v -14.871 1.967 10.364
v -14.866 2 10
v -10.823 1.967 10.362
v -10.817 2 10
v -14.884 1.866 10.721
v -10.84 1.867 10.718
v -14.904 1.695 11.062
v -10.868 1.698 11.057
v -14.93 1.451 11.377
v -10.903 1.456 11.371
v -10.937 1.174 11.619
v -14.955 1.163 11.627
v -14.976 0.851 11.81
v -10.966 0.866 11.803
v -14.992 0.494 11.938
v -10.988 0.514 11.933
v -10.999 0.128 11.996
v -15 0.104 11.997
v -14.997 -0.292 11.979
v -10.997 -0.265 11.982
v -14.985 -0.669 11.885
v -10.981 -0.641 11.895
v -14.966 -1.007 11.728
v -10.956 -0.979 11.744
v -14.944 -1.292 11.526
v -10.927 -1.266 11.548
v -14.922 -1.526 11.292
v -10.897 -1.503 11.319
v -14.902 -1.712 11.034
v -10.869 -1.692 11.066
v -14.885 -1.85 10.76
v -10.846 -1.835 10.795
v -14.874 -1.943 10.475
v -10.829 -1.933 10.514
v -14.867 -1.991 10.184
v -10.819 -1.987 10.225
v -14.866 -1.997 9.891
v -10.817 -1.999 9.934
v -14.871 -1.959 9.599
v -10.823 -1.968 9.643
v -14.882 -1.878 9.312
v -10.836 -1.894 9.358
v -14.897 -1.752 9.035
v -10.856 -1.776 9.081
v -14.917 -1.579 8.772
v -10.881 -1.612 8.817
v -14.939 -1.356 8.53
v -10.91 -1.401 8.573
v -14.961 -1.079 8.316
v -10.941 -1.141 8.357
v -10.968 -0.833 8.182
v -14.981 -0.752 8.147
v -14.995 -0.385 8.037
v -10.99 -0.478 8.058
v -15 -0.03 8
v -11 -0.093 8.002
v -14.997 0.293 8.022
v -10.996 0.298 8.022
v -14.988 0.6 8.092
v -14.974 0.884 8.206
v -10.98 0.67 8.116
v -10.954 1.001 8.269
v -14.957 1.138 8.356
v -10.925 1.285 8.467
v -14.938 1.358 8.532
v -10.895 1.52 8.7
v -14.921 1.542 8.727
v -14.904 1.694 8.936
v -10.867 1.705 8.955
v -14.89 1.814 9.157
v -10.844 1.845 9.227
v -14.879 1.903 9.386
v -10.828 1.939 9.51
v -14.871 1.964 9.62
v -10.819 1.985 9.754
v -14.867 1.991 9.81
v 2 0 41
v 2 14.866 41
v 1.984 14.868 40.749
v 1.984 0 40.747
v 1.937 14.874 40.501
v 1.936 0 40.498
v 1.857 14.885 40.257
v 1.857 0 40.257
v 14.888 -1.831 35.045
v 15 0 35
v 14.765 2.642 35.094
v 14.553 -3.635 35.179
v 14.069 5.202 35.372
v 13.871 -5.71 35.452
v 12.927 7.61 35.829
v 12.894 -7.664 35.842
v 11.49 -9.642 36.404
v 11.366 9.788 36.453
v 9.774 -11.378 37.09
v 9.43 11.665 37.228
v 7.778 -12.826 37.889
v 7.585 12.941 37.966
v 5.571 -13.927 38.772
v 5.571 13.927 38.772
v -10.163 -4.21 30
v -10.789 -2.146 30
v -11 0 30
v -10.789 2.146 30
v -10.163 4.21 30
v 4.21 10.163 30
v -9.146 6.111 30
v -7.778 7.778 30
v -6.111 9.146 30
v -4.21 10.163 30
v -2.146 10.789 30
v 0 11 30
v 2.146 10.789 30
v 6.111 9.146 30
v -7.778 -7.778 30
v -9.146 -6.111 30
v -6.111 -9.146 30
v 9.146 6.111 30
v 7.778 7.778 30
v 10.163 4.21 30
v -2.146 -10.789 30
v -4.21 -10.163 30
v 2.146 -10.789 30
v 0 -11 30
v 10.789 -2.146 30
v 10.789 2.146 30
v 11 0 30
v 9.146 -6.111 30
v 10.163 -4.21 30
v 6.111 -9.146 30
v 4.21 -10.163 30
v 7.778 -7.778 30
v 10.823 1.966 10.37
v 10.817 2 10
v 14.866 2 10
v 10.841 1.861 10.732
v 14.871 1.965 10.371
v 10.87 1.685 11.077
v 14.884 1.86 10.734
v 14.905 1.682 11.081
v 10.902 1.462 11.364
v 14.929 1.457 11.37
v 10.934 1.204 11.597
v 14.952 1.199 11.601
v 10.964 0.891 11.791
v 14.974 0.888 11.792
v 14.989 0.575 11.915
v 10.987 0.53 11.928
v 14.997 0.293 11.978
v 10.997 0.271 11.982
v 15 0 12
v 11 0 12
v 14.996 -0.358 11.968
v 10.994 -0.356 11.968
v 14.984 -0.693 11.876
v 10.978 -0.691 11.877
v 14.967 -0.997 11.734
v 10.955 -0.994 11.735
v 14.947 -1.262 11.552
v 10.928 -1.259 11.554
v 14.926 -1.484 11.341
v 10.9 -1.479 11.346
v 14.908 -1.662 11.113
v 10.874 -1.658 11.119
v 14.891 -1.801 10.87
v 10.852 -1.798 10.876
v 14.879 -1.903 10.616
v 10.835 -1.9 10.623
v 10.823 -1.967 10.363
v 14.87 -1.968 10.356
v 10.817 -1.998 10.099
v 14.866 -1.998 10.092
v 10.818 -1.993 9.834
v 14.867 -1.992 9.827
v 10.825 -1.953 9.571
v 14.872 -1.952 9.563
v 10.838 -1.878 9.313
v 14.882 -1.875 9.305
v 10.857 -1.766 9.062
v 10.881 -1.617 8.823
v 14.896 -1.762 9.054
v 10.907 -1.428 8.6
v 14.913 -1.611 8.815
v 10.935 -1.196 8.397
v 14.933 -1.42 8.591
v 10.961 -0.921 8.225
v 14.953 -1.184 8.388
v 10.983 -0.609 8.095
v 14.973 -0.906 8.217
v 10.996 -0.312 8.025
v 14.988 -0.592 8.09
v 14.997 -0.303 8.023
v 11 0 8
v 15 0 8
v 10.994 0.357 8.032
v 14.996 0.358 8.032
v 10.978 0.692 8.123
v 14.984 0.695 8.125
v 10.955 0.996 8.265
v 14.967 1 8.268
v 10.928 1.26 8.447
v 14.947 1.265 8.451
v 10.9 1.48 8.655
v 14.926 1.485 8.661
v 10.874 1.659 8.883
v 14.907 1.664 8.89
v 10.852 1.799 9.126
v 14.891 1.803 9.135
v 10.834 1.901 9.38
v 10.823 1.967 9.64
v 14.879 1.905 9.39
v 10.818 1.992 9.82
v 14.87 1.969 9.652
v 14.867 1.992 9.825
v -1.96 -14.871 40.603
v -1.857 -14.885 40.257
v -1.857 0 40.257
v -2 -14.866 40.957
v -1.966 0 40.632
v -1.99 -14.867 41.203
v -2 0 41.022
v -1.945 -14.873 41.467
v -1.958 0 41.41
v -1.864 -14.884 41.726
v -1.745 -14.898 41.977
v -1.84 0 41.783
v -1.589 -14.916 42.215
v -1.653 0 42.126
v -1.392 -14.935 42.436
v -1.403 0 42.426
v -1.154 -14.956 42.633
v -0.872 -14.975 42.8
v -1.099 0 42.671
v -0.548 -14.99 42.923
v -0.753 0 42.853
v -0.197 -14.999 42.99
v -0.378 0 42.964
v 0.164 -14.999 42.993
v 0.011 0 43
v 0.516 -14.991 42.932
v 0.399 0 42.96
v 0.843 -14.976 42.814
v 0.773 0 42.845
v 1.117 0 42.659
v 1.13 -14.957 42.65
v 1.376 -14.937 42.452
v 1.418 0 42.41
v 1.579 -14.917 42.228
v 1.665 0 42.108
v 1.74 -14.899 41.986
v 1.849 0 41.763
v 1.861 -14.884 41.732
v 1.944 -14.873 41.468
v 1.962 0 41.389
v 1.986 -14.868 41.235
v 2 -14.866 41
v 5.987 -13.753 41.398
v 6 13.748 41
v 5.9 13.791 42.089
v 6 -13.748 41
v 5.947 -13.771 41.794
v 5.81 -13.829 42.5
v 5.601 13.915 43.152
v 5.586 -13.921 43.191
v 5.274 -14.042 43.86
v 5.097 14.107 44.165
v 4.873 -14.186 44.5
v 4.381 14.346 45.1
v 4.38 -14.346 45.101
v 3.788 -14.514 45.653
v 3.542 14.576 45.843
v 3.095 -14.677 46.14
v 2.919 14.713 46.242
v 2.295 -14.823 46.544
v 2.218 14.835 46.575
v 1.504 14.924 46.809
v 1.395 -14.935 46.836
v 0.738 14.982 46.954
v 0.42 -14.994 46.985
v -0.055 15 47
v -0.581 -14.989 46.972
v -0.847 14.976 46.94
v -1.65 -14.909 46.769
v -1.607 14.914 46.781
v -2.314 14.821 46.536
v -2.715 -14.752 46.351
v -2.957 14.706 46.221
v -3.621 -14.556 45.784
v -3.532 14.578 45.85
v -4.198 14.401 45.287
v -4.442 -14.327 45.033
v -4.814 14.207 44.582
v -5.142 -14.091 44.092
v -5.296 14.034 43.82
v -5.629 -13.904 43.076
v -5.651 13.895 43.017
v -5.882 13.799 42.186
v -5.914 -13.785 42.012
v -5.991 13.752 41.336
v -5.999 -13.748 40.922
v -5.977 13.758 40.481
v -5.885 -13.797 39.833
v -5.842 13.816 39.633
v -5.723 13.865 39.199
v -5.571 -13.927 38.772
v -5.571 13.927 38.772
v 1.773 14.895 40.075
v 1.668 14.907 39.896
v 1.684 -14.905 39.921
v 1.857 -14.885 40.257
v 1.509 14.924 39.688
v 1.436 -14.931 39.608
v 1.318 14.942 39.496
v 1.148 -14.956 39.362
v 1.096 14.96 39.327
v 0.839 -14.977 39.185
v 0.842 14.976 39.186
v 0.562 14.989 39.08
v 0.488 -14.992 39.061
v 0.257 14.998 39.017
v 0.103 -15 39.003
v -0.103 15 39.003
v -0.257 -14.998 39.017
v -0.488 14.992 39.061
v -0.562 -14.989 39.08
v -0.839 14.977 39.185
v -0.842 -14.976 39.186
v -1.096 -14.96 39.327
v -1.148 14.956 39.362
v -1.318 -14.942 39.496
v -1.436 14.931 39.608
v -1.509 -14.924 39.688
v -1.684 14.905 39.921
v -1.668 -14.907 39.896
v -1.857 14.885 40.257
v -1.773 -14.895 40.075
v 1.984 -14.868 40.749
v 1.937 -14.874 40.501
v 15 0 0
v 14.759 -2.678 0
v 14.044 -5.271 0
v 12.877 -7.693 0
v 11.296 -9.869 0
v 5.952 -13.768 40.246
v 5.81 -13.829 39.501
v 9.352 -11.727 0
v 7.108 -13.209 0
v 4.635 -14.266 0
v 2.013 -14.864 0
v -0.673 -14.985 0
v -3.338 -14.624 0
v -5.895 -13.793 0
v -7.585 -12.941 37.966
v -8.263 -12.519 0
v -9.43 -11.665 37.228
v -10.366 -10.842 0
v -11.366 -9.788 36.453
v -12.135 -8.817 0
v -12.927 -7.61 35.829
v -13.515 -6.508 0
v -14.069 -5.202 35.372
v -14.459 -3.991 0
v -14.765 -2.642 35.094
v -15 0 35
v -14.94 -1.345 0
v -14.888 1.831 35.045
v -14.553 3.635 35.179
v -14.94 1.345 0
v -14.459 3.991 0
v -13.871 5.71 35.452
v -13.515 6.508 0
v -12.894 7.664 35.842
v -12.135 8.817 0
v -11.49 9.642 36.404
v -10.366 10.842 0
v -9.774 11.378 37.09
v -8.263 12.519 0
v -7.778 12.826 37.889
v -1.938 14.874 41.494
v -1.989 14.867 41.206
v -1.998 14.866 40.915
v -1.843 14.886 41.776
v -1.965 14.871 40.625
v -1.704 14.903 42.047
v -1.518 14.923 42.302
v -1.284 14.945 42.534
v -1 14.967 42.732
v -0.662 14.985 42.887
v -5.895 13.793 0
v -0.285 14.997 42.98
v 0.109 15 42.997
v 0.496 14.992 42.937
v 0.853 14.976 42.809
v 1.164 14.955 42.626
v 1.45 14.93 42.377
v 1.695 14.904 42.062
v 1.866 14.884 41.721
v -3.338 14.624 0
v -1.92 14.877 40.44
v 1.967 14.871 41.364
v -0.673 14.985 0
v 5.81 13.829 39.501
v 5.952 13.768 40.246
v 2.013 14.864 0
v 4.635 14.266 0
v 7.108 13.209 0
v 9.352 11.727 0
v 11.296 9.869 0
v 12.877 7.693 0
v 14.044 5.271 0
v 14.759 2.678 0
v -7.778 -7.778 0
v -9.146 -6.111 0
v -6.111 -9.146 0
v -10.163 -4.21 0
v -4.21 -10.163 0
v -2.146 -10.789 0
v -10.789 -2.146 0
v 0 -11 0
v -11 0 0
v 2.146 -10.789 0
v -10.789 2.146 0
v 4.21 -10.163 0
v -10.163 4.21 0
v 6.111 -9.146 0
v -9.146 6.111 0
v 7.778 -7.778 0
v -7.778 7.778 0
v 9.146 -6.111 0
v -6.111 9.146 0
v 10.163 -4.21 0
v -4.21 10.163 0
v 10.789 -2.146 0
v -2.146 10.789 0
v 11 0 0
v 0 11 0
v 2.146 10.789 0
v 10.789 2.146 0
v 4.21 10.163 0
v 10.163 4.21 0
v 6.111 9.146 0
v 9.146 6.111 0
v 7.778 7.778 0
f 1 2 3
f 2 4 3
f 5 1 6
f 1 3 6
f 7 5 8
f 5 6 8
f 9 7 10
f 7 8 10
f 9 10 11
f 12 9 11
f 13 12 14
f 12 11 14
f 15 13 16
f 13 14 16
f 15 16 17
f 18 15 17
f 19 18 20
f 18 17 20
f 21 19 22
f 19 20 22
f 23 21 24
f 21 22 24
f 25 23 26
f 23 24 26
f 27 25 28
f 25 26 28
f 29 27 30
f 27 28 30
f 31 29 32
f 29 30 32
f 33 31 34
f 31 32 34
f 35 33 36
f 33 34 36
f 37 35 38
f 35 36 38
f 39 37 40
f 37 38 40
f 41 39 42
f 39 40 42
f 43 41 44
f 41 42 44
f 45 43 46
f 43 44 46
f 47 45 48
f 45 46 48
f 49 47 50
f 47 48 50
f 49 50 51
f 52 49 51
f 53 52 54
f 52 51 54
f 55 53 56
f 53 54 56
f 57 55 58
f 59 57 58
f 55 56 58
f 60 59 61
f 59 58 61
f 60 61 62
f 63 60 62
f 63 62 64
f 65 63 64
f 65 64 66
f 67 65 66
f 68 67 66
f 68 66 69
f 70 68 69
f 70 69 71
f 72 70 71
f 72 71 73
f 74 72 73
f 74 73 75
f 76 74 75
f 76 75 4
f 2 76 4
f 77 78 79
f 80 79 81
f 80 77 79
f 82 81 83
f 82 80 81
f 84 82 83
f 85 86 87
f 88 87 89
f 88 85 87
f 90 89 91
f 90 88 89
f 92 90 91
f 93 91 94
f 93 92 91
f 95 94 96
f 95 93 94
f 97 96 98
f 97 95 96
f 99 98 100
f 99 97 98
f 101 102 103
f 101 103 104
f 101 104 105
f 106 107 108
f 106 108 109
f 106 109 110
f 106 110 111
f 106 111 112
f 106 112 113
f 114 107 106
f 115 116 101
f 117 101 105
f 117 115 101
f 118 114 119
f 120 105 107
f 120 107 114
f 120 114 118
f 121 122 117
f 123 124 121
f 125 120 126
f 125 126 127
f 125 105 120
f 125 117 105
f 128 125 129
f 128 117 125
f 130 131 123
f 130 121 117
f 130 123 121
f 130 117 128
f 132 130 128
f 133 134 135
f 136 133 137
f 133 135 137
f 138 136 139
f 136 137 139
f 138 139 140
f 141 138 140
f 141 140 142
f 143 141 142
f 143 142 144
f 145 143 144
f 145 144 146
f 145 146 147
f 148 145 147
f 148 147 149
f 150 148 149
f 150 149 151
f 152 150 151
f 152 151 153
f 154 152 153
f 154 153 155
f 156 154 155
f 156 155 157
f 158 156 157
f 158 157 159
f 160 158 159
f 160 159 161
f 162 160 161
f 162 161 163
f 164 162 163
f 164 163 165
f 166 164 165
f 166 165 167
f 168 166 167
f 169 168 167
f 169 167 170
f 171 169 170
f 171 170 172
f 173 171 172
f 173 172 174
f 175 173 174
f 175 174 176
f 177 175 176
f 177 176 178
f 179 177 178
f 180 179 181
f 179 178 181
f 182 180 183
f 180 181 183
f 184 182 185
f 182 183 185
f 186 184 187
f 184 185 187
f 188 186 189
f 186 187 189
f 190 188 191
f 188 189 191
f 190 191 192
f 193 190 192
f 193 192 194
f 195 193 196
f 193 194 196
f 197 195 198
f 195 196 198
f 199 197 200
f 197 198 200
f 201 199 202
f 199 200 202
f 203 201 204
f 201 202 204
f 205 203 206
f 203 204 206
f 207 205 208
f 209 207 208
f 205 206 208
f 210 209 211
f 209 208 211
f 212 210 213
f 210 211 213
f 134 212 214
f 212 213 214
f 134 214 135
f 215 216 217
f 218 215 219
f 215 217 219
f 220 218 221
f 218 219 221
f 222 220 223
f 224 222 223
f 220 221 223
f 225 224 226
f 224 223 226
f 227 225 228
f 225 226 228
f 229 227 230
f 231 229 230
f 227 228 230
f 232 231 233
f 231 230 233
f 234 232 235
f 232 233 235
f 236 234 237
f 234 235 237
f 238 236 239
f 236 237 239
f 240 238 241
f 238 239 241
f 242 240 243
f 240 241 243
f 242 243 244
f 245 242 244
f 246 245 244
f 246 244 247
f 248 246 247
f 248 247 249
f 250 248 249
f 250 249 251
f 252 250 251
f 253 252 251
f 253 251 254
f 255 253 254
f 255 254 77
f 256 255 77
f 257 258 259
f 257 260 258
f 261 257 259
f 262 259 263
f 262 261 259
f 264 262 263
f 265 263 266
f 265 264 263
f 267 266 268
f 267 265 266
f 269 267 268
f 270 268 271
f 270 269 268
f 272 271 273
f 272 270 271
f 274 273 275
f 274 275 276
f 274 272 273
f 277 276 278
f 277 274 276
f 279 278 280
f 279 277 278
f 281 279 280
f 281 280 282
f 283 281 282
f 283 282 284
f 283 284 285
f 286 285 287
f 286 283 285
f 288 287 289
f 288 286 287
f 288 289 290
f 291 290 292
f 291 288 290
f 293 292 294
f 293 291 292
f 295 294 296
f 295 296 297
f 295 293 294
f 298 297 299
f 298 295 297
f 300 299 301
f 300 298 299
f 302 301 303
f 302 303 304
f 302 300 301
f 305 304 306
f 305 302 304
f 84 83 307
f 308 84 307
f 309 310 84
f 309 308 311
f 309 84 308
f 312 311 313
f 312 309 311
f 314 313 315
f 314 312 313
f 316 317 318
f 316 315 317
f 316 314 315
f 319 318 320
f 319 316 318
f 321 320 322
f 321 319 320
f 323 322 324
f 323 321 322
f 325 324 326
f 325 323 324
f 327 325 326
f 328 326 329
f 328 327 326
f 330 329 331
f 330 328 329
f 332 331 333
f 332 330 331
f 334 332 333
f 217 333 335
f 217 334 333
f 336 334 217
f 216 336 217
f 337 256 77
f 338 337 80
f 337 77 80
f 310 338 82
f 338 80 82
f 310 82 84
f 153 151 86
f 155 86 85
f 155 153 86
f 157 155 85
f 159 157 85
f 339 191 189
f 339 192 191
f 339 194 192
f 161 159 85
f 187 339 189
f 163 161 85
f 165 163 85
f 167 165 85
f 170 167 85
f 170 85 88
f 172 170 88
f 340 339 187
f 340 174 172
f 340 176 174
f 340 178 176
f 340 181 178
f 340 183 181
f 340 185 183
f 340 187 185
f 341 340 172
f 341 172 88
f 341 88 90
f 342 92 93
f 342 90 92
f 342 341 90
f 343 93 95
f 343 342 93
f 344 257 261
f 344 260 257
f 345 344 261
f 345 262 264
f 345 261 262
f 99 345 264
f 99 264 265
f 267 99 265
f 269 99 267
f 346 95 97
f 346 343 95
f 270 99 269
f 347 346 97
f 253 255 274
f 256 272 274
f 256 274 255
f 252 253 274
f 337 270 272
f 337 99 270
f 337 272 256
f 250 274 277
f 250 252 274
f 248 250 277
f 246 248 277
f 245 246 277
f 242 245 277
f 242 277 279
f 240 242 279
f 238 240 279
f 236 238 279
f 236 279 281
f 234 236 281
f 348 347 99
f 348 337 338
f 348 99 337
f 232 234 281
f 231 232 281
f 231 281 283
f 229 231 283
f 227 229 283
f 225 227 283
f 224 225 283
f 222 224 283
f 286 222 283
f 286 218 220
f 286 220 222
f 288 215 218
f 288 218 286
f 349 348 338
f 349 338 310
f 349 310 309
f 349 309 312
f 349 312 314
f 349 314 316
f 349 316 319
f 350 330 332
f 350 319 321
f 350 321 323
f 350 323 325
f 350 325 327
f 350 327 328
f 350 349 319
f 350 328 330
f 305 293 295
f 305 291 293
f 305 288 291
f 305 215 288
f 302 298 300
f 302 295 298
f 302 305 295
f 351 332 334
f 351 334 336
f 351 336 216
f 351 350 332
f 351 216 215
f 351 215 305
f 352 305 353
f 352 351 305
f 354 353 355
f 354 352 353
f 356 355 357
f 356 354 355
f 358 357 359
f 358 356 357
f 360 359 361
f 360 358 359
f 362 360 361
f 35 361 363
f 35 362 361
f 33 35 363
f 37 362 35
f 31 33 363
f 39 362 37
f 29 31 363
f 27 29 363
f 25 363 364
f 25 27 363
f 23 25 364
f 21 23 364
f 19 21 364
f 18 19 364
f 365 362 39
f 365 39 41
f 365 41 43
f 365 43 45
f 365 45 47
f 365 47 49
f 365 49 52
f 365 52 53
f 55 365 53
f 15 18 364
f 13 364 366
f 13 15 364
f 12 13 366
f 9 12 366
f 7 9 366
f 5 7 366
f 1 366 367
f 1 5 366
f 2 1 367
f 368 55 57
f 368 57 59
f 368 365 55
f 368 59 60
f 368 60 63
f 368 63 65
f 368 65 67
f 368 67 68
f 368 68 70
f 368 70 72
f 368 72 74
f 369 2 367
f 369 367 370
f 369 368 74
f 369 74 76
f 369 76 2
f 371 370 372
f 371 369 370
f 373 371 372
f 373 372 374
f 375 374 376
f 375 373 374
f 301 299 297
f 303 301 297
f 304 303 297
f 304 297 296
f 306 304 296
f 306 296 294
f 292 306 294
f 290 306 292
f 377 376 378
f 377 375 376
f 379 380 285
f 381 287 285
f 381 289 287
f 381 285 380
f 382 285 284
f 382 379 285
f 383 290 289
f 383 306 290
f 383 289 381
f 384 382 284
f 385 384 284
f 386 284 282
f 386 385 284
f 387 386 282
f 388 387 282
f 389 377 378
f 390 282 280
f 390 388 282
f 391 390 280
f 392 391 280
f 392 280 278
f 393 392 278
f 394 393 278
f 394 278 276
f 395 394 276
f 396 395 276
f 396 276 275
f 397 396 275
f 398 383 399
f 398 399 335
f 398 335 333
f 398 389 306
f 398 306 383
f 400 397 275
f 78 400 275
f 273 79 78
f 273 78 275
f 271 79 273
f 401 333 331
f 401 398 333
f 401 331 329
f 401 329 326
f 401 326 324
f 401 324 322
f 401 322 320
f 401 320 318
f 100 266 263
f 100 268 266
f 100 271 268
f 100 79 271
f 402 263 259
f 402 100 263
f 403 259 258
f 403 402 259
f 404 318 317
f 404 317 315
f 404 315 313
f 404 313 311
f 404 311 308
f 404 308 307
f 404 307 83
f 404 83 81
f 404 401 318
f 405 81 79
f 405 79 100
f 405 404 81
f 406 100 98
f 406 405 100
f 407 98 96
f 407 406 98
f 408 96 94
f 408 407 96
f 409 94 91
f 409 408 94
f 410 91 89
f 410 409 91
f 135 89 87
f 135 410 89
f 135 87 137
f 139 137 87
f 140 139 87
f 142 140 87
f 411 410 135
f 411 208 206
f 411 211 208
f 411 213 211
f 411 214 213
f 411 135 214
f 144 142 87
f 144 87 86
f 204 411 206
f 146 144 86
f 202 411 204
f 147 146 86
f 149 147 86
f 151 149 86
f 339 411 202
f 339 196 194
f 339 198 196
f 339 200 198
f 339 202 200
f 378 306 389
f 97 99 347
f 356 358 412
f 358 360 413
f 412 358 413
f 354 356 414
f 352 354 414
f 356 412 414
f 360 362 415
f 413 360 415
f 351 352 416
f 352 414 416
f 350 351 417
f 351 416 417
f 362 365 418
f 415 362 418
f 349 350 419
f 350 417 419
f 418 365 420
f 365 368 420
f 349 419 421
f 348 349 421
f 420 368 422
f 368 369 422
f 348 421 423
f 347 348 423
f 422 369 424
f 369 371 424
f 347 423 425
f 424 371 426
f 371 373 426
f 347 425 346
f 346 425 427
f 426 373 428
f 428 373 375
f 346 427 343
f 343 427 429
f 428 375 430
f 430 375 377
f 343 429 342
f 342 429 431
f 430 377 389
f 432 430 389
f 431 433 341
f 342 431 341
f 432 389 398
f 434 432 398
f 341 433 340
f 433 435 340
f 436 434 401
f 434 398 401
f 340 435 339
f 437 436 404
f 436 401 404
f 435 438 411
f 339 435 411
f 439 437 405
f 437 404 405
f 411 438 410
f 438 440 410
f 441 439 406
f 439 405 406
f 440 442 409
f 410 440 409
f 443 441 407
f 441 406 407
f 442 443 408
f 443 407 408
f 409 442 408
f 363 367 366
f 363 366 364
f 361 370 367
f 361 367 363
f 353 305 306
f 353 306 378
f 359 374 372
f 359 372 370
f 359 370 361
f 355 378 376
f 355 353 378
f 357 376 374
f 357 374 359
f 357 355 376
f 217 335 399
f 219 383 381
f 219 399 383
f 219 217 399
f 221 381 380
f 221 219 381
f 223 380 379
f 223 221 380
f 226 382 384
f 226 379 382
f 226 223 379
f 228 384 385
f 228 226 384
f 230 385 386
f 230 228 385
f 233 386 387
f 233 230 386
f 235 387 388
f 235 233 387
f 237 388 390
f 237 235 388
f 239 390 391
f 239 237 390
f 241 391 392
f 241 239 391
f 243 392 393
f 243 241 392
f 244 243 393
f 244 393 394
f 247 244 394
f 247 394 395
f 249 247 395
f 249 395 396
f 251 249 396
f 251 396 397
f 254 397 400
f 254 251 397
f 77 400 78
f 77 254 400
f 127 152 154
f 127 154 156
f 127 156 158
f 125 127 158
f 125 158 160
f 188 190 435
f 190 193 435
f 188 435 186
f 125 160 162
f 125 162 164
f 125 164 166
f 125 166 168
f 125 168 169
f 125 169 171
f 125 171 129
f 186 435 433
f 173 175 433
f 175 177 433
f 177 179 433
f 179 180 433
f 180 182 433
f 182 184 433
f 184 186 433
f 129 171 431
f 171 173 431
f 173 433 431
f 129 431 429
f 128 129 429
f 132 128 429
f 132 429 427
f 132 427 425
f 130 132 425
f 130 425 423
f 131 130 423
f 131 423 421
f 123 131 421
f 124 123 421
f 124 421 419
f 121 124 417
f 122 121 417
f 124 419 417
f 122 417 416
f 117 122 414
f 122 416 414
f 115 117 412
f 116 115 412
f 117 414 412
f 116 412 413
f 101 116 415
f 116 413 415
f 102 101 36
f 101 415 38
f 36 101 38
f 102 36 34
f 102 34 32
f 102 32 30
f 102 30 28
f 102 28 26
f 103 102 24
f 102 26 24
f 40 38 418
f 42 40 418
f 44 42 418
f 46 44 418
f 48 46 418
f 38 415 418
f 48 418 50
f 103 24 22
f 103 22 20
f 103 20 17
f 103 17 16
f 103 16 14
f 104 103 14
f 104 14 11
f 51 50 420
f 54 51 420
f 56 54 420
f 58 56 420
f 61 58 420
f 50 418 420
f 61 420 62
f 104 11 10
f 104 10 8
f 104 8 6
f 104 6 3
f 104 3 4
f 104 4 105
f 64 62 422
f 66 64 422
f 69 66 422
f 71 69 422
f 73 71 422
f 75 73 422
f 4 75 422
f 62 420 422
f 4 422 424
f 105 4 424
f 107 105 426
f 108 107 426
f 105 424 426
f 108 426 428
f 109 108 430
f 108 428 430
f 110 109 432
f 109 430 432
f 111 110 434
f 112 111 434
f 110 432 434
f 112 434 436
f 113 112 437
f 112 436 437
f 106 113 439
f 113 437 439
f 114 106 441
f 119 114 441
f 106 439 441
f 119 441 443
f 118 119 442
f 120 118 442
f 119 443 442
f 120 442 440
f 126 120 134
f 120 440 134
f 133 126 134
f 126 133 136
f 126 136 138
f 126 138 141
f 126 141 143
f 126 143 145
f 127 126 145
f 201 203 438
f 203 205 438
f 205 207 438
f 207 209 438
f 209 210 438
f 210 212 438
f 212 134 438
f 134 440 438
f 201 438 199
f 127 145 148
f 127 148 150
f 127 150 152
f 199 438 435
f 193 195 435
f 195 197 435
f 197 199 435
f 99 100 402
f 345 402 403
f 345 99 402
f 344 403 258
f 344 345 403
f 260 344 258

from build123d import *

# Parameters (mm, degrees)
F0_R     = 15
F1_DEPTH = 35
F3_DEPTH = 15
F4_W     = 36.4194698632
F4_H     = 35.84138304
F4_R     = 15
F5_DEPTH = 50
F6_R     = 11
F7_DEPTH = 30
F8_R     = 2
F9_DEPTH = 15


with BuildPart() as f1:
    # F0 (on Top) → F1 (new body)
    with BuildSketch(Plane.XY):
        Circle(F0_R)
    extrude(amount=F1_DEPTH)

    # F2 (on Front) → F3 (join, symmetric)
    with BuildSketch(Plane.XZ):
        with BuildLine():
            ThreePointArc((1.082e-07, 35), (-3.363772811, 36.0315965868), (-5.5708601453, 38.7716559419))
            Line((-5.5708601453, 38.7716559419), (-15, 35))
            Line((-15, 35), (1.082e-07, 35))
        make_face()
        with BuildLine():
            Line((-1.8569533818, 40.2572186473), (-5.5708601453, 38.7716559419))
            ThreePointArc((-5.5708601453, 38.7716559419), (-3.363772811, 36.0315965868), (1.082e-07, 35))
            ThreePointArc((1.082e-07, 35), (3.3637729006, 36.0315966475), (5.5708601453, 38.7716559419))
            Line((5.5708601453, 38.7716559419), (1.8569533818, 40.2572186473))
            ThreePointArc((1.8569533818, 40.2572186473), (0, 39), (-1.8569533818, 40.2572186473))
        make_face()
        with BuildLine():
            Line((15, 35), (5.5708601453, 38.7716559419))
            ThreePointArc((5.5708601453, 38.7716559419), (3.3637729006, 36.0315966475), (1.082e-07, 35))
            Line((1.082e-07, 35), (15, 35))
        make_face()
        with BuildLine():
            ThreePointArc((5.5708601453, 38.7716559419), (5.8917383204, 39.8653548731), (6, 41))
            ThreePointArc((6, 41), (-1.1346451269, 46.8917383204), (-5.5708601453, 38.7716559419))
            Line((-5.5708601453, 38.7716559419), (-1.8569533818, 40.2572186473))
            ThreePointArc((-1.8569533818, 40.2572186473), (-0.3782150423, 42.9639127735), (2, 41))
            ThreePointArc((2, 41), (1.9639127735, 40.6217849577), (1.8569533818, 40.2572186473))
            Line((1.8569533818, 40.2572186473), (5.5708601453, 38.7716559419))
        make_face()
    extrude(amount=F3_DEPTH, both=True)

    # F4 (on face) → F5 (cut)
    with BuildSketch(Plane(origin=(0, 0, 0), x_dir=(1, 0, 0), z_dir=(0, 0, -1))):
        with Locations((1.1052396148, -0.1735072583)):
            Rectangle(F4_W, F4_H)
        Circle(F4_R, mode=Mode.SUBTRACT)
    extrude(amount=-F5_DEPTH, mode=Mode.SUBTRACT)

    # F6 (on face) → F7 (cut)
    with BuildSketch(Plane(origin=(0, 0, 0), x_dir=(1, 0, 0), z_dir=(0, 0, -1))):
        Circle(F6_R)
    extrude(amount=-F7_DEPTH, mode=Mode.SUBTRACT)

    # F8 (on Right) → F9 (cut, symmetric)
    with BuildSketch(Plane.YZ):
        with Locations((0, 10)):
            Circle(F8_R)
    extrude(amount=F9_DEPTH, both=True, mode=Mode.SUBTRACT)


solid = f1.part
